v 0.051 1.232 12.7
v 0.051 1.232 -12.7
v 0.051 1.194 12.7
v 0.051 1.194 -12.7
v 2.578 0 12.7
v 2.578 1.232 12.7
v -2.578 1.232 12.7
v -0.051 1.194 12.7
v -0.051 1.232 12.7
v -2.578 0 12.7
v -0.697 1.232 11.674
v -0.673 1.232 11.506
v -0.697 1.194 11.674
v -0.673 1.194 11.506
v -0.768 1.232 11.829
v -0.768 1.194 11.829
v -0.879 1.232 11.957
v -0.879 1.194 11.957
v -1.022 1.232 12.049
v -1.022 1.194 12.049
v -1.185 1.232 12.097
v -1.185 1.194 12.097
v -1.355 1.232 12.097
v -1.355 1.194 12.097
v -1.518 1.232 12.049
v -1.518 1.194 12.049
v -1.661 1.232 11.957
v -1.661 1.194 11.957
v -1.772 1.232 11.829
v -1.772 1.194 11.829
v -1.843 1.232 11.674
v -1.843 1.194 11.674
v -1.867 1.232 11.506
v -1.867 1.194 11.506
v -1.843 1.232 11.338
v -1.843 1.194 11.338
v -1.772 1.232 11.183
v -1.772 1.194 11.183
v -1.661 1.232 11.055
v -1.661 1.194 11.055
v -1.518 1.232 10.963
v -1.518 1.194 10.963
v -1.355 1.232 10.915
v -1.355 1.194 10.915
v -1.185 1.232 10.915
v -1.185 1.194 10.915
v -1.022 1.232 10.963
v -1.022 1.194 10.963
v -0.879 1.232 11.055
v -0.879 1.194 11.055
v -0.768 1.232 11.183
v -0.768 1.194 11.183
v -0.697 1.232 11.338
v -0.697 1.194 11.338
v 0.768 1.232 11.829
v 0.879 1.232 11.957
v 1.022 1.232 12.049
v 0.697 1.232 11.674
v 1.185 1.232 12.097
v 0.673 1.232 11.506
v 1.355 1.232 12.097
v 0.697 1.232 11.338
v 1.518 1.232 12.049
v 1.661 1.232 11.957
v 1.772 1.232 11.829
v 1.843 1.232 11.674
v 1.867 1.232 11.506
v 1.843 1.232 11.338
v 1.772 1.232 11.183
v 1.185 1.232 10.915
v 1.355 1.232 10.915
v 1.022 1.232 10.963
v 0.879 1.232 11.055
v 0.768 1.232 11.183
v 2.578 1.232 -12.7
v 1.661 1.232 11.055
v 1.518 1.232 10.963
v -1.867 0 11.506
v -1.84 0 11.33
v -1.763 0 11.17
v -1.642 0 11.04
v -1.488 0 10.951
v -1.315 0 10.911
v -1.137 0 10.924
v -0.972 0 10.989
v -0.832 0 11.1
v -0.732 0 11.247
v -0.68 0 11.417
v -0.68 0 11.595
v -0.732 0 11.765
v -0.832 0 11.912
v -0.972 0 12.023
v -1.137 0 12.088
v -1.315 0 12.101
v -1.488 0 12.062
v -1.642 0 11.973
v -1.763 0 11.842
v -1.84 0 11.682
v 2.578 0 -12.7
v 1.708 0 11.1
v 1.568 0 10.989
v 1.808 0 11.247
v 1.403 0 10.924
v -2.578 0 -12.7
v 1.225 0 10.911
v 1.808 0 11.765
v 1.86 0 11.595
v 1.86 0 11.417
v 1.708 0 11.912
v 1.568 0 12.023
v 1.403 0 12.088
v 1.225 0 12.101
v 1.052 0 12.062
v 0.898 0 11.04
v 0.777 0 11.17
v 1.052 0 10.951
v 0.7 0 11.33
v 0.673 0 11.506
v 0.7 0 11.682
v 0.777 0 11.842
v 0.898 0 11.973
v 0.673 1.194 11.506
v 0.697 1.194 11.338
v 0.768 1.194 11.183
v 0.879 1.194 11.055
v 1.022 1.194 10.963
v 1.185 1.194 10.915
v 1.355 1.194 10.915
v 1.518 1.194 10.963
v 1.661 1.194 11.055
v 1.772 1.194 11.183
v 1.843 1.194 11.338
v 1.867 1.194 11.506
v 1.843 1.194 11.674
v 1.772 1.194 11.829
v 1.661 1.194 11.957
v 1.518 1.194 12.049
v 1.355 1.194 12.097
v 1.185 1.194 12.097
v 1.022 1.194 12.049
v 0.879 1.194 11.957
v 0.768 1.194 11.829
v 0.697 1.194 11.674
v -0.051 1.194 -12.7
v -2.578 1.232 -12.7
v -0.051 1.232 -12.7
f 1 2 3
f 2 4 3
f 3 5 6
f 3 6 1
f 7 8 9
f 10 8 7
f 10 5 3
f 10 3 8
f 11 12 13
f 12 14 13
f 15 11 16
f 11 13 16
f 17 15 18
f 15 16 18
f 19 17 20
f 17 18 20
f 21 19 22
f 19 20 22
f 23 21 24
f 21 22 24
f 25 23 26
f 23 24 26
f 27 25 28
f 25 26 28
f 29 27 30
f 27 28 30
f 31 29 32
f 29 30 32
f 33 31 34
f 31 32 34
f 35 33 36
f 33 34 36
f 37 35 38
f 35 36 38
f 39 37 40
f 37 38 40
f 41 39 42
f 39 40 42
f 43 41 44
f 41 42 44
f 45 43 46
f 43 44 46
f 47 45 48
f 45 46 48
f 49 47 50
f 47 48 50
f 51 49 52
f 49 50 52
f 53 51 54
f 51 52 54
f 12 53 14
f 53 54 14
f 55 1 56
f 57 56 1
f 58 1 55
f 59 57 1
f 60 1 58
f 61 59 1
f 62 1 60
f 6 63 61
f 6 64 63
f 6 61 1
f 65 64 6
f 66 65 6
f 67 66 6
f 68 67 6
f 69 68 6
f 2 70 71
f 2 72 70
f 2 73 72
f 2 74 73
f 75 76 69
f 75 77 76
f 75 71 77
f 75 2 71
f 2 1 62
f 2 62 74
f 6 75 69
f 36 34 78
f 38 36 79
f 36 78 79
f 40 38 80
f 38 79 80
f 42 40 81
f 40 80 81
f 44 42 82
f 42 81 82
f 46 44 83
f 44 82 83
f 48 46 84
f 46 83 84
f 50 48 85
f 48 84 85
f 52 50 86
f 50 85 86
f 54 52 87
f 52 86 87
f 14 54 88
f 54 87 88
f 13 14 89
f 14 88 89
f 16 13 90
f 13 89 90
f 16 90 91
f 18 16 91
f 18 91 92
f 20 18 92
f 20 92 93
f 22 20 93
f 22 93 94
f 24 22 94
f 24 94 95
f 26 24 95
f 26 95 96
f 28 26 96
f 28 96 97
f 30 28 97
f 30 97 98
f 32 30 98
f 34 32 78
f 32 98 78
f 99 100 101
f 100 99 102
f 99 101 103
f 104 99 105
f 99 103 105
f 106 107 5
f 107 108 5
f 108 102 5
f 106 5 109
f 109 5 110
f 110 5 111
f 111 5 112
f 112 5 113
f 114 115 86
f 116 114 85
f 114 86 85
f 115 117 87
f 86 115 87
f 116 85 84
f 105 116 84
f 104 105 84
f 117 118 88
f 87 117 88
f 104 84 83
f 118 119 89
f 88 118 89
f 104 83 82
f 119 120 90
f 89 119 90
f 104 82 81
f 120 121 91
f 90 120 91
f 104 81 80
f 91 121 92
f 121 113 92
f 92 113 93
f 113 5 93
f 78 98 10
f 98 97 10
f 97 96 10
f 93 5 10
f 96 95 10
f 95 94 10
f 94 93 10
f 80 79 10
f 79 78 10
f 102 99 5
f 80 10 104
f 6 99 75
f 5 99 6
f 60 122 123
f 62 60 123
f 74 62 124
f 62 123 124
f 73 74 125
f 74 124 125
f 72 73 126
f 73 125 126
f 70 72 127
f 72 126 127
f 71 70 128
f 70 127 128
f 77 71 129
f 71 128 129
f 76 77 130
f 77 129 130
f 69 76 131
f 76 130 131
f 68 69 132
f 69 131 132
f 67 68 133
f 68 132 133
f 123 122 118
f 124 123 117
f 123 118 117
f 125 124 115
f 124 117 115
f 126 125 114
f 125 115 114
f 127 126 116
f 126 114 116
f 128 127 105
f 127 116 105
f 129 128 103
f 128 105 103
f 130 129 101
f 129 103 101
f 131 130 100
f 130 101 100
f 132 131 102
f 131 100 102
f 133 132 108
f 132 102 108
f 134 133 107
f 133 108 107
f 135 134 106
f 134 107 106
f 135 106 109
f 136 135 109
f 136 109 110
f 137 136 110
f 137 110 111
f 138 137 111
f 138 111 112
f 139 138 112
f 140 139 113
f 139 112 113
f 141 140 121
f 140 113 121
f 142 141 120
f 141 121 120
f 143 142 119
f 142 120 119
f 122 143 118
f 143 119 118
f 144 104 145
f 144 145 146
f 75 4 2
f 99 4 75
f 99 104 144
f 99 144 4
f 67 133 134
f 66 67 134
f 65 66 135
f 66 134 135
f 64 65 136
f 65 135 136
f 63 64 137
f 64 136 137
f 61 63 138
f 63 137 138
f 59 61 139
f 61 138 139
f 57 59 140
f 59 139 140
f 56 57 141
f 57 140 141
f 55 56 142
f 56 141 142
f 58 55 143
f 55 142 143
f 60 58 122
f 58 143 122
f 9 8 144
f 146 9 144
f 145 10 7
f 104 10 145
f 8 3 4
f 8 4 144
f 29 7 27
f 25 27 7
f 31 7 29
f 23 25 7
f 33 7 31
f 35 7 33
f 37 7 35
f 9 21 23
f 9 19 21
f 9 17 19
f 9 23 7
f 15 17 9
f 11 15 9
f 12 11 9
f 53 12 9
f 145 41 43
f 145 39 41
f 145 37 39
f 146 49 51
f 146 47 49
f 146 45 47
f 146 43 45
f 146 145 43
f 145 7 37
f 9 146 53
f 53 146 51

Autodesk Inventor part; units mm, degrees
ref_plane "YZ Plane" through (0, 0, 0) normal (1, 0, 0) x (0, 1, 0)
ref_plane "XZ Plane" through (0, 0, 0) normal (0, 1, 0) x (-1, 0, 0)
ref_plane "XY Plane" through (0, 0, 0) normal (0, 0, 1) x (1, 0, 0)
sketch "Sketch1" plane through (0, 0, 0) normal (0, 1, 0) x (-1, 0, 0)
  line L0 (-2.5781, 12.7) -> (2.5781, 12.7)
  line L1 (2.5781, 12.7) -> (2.5781, -12.7)
  line L2 (2.5781, -12.7) -> (-2.5781, -12.7)
  line L3 (-2.5781, -12.7) -> (-2.5781, 12.7)
  line L4 (-2.5781, 12.7) -> (2.5781, -12.7) construction
  line L5 (2.5781, 12.7) -> (-2.5781, -12.7) construction
  point P0 (0, 0)
  dimension "d0" = 5.1562
  dimension "d1" = 25.4
extrude "Extrusion1" add sketch "Sketch1" along normal blind 1.1938
sketch "Sketch2" plane through (0, 1.1938, 0) normal (0, 1, 0) x (1, 0, 0)
  line L0 (2.5781, 12.7) -> (-2.5781, 12.7) projected
  line L1 (-2.5781, 12.7) -> (-2.5781, -12.7) projected
  line L2 (-2.5781, -12.7) -> (2.5781, -12.7) projected
  line L3 (2.5781, -12.7) -> (2.5781, 12.7) projected
  line L4 (-3.6093, 0) -> (3.6093, 0) projected
  line L5 (0, 17.78) -> (0, -17.78) projected
  circle A0 centre (1.27, -11.5062) radius 0.5969
  circle A1 centre (-1.27, -11.5062) radius 0.5969
  line L6 (2.5781, 12.7) -> (-2.5781, 12.7) projected
  line L7 (0.0508, -12.7) -> (-0.0508, -12.7)
  line L8 (-0.0508, -12.7) -> (-0.0508, 12.7)
  line L9 (-0.0508, 12.7) -> (0.0508, 12.7)
  line L10 (0.0508, 12.7) -> (0.0508, -12.7)
  line L11 (0.0508, -12.7) -> (-0.0508, 12.7) construction
  line L12 (-0.0508, -12.7) -> (0.0508, 12.7) construction
  point P0 (0, 0)
  dimension "d4" = 1.1938
  dimension "d5" = 1.1938
  dimension "d8" = 1.27
  dimension "d9" = 0.1016
extrude "Extrusion2" add sketch "Sketch2" along normal blind 0.0381 contours L3 L4 L10 L0 | L3 L2 L10 L4 | L8 L4 L1 L0 | L8 L2 L1 L4
sketch "Sketch3" plane through (1.27, 1.1938, 11.5062) normal (0, 1, 0) x (1, 0, 0)
  point P0 (-1.27, 11.5062)
sketch "Sketch4" plane through (0, 0, 0) normal (0, 1, 0) x (-1, 0, 0)
  circle A0 centre (-1.27, 11.5062) radius 0.5969 projected
  circle A1 centre (1.27, 11.5062) radius 0.5969 projected
  line L0 (3.6093, 0) -> (-3.6093, 0) projected
  line L1 (0, -17.78) -> (0, 17.78) projected
  line L2 (0.0508, -12.7) -> (2.5781, -12.7) projected
  line L3 (2.5781, -12.7) -> (2.5781, 12.7) projected
  line L4 (2.5781, 12.7) -> (0.0508, 12.7) projected
  line L5 (0.0508, 12.7) -> (0.0508, -12.7) projected
  circle A2 centre (1.27, 11.5062) radius 0.5969 projected
  line L6 (-0.0508, 12.7) -> (-2.5781, 12.7) projected
  line L7 (-2.5781, 12.7) -> (-2.5781, -12.7) projected
  line L8 (-2.5781, -12.7) -> (-0.0508, -12.7) projected
  line L9 (-0.0508, -12.7) -> (-0.0508, 12.7) projected
  circle A3 centre (-1.27, 11.5062) radius 0.5969 projected
  point P0 (0, 0)
extrude "Extrusion3" cut sketch "Sketch4" along normal through all contours A0 | A1
equation "\"BendRadius\" = Thickness"
equation "\"BendReliefWidth\" = Thickness"
equation "\"BendReliefDepth\" = 0.5 * Thickness"
equation "\"CornerReliefSize\" = 4 * Thickness"
equation "\"MinimumRemnant\" = 2 * Thickness"
equation "\"TransitionRadius\" = BendRadius"
equation "\"JacobiRadiusSize\" = BendRadius"
equation "\"GapSize\" = Thickness"
equation "\"Thickness\" = 3.048"
properties part number "Leads+ChannelForSingleHeater"
